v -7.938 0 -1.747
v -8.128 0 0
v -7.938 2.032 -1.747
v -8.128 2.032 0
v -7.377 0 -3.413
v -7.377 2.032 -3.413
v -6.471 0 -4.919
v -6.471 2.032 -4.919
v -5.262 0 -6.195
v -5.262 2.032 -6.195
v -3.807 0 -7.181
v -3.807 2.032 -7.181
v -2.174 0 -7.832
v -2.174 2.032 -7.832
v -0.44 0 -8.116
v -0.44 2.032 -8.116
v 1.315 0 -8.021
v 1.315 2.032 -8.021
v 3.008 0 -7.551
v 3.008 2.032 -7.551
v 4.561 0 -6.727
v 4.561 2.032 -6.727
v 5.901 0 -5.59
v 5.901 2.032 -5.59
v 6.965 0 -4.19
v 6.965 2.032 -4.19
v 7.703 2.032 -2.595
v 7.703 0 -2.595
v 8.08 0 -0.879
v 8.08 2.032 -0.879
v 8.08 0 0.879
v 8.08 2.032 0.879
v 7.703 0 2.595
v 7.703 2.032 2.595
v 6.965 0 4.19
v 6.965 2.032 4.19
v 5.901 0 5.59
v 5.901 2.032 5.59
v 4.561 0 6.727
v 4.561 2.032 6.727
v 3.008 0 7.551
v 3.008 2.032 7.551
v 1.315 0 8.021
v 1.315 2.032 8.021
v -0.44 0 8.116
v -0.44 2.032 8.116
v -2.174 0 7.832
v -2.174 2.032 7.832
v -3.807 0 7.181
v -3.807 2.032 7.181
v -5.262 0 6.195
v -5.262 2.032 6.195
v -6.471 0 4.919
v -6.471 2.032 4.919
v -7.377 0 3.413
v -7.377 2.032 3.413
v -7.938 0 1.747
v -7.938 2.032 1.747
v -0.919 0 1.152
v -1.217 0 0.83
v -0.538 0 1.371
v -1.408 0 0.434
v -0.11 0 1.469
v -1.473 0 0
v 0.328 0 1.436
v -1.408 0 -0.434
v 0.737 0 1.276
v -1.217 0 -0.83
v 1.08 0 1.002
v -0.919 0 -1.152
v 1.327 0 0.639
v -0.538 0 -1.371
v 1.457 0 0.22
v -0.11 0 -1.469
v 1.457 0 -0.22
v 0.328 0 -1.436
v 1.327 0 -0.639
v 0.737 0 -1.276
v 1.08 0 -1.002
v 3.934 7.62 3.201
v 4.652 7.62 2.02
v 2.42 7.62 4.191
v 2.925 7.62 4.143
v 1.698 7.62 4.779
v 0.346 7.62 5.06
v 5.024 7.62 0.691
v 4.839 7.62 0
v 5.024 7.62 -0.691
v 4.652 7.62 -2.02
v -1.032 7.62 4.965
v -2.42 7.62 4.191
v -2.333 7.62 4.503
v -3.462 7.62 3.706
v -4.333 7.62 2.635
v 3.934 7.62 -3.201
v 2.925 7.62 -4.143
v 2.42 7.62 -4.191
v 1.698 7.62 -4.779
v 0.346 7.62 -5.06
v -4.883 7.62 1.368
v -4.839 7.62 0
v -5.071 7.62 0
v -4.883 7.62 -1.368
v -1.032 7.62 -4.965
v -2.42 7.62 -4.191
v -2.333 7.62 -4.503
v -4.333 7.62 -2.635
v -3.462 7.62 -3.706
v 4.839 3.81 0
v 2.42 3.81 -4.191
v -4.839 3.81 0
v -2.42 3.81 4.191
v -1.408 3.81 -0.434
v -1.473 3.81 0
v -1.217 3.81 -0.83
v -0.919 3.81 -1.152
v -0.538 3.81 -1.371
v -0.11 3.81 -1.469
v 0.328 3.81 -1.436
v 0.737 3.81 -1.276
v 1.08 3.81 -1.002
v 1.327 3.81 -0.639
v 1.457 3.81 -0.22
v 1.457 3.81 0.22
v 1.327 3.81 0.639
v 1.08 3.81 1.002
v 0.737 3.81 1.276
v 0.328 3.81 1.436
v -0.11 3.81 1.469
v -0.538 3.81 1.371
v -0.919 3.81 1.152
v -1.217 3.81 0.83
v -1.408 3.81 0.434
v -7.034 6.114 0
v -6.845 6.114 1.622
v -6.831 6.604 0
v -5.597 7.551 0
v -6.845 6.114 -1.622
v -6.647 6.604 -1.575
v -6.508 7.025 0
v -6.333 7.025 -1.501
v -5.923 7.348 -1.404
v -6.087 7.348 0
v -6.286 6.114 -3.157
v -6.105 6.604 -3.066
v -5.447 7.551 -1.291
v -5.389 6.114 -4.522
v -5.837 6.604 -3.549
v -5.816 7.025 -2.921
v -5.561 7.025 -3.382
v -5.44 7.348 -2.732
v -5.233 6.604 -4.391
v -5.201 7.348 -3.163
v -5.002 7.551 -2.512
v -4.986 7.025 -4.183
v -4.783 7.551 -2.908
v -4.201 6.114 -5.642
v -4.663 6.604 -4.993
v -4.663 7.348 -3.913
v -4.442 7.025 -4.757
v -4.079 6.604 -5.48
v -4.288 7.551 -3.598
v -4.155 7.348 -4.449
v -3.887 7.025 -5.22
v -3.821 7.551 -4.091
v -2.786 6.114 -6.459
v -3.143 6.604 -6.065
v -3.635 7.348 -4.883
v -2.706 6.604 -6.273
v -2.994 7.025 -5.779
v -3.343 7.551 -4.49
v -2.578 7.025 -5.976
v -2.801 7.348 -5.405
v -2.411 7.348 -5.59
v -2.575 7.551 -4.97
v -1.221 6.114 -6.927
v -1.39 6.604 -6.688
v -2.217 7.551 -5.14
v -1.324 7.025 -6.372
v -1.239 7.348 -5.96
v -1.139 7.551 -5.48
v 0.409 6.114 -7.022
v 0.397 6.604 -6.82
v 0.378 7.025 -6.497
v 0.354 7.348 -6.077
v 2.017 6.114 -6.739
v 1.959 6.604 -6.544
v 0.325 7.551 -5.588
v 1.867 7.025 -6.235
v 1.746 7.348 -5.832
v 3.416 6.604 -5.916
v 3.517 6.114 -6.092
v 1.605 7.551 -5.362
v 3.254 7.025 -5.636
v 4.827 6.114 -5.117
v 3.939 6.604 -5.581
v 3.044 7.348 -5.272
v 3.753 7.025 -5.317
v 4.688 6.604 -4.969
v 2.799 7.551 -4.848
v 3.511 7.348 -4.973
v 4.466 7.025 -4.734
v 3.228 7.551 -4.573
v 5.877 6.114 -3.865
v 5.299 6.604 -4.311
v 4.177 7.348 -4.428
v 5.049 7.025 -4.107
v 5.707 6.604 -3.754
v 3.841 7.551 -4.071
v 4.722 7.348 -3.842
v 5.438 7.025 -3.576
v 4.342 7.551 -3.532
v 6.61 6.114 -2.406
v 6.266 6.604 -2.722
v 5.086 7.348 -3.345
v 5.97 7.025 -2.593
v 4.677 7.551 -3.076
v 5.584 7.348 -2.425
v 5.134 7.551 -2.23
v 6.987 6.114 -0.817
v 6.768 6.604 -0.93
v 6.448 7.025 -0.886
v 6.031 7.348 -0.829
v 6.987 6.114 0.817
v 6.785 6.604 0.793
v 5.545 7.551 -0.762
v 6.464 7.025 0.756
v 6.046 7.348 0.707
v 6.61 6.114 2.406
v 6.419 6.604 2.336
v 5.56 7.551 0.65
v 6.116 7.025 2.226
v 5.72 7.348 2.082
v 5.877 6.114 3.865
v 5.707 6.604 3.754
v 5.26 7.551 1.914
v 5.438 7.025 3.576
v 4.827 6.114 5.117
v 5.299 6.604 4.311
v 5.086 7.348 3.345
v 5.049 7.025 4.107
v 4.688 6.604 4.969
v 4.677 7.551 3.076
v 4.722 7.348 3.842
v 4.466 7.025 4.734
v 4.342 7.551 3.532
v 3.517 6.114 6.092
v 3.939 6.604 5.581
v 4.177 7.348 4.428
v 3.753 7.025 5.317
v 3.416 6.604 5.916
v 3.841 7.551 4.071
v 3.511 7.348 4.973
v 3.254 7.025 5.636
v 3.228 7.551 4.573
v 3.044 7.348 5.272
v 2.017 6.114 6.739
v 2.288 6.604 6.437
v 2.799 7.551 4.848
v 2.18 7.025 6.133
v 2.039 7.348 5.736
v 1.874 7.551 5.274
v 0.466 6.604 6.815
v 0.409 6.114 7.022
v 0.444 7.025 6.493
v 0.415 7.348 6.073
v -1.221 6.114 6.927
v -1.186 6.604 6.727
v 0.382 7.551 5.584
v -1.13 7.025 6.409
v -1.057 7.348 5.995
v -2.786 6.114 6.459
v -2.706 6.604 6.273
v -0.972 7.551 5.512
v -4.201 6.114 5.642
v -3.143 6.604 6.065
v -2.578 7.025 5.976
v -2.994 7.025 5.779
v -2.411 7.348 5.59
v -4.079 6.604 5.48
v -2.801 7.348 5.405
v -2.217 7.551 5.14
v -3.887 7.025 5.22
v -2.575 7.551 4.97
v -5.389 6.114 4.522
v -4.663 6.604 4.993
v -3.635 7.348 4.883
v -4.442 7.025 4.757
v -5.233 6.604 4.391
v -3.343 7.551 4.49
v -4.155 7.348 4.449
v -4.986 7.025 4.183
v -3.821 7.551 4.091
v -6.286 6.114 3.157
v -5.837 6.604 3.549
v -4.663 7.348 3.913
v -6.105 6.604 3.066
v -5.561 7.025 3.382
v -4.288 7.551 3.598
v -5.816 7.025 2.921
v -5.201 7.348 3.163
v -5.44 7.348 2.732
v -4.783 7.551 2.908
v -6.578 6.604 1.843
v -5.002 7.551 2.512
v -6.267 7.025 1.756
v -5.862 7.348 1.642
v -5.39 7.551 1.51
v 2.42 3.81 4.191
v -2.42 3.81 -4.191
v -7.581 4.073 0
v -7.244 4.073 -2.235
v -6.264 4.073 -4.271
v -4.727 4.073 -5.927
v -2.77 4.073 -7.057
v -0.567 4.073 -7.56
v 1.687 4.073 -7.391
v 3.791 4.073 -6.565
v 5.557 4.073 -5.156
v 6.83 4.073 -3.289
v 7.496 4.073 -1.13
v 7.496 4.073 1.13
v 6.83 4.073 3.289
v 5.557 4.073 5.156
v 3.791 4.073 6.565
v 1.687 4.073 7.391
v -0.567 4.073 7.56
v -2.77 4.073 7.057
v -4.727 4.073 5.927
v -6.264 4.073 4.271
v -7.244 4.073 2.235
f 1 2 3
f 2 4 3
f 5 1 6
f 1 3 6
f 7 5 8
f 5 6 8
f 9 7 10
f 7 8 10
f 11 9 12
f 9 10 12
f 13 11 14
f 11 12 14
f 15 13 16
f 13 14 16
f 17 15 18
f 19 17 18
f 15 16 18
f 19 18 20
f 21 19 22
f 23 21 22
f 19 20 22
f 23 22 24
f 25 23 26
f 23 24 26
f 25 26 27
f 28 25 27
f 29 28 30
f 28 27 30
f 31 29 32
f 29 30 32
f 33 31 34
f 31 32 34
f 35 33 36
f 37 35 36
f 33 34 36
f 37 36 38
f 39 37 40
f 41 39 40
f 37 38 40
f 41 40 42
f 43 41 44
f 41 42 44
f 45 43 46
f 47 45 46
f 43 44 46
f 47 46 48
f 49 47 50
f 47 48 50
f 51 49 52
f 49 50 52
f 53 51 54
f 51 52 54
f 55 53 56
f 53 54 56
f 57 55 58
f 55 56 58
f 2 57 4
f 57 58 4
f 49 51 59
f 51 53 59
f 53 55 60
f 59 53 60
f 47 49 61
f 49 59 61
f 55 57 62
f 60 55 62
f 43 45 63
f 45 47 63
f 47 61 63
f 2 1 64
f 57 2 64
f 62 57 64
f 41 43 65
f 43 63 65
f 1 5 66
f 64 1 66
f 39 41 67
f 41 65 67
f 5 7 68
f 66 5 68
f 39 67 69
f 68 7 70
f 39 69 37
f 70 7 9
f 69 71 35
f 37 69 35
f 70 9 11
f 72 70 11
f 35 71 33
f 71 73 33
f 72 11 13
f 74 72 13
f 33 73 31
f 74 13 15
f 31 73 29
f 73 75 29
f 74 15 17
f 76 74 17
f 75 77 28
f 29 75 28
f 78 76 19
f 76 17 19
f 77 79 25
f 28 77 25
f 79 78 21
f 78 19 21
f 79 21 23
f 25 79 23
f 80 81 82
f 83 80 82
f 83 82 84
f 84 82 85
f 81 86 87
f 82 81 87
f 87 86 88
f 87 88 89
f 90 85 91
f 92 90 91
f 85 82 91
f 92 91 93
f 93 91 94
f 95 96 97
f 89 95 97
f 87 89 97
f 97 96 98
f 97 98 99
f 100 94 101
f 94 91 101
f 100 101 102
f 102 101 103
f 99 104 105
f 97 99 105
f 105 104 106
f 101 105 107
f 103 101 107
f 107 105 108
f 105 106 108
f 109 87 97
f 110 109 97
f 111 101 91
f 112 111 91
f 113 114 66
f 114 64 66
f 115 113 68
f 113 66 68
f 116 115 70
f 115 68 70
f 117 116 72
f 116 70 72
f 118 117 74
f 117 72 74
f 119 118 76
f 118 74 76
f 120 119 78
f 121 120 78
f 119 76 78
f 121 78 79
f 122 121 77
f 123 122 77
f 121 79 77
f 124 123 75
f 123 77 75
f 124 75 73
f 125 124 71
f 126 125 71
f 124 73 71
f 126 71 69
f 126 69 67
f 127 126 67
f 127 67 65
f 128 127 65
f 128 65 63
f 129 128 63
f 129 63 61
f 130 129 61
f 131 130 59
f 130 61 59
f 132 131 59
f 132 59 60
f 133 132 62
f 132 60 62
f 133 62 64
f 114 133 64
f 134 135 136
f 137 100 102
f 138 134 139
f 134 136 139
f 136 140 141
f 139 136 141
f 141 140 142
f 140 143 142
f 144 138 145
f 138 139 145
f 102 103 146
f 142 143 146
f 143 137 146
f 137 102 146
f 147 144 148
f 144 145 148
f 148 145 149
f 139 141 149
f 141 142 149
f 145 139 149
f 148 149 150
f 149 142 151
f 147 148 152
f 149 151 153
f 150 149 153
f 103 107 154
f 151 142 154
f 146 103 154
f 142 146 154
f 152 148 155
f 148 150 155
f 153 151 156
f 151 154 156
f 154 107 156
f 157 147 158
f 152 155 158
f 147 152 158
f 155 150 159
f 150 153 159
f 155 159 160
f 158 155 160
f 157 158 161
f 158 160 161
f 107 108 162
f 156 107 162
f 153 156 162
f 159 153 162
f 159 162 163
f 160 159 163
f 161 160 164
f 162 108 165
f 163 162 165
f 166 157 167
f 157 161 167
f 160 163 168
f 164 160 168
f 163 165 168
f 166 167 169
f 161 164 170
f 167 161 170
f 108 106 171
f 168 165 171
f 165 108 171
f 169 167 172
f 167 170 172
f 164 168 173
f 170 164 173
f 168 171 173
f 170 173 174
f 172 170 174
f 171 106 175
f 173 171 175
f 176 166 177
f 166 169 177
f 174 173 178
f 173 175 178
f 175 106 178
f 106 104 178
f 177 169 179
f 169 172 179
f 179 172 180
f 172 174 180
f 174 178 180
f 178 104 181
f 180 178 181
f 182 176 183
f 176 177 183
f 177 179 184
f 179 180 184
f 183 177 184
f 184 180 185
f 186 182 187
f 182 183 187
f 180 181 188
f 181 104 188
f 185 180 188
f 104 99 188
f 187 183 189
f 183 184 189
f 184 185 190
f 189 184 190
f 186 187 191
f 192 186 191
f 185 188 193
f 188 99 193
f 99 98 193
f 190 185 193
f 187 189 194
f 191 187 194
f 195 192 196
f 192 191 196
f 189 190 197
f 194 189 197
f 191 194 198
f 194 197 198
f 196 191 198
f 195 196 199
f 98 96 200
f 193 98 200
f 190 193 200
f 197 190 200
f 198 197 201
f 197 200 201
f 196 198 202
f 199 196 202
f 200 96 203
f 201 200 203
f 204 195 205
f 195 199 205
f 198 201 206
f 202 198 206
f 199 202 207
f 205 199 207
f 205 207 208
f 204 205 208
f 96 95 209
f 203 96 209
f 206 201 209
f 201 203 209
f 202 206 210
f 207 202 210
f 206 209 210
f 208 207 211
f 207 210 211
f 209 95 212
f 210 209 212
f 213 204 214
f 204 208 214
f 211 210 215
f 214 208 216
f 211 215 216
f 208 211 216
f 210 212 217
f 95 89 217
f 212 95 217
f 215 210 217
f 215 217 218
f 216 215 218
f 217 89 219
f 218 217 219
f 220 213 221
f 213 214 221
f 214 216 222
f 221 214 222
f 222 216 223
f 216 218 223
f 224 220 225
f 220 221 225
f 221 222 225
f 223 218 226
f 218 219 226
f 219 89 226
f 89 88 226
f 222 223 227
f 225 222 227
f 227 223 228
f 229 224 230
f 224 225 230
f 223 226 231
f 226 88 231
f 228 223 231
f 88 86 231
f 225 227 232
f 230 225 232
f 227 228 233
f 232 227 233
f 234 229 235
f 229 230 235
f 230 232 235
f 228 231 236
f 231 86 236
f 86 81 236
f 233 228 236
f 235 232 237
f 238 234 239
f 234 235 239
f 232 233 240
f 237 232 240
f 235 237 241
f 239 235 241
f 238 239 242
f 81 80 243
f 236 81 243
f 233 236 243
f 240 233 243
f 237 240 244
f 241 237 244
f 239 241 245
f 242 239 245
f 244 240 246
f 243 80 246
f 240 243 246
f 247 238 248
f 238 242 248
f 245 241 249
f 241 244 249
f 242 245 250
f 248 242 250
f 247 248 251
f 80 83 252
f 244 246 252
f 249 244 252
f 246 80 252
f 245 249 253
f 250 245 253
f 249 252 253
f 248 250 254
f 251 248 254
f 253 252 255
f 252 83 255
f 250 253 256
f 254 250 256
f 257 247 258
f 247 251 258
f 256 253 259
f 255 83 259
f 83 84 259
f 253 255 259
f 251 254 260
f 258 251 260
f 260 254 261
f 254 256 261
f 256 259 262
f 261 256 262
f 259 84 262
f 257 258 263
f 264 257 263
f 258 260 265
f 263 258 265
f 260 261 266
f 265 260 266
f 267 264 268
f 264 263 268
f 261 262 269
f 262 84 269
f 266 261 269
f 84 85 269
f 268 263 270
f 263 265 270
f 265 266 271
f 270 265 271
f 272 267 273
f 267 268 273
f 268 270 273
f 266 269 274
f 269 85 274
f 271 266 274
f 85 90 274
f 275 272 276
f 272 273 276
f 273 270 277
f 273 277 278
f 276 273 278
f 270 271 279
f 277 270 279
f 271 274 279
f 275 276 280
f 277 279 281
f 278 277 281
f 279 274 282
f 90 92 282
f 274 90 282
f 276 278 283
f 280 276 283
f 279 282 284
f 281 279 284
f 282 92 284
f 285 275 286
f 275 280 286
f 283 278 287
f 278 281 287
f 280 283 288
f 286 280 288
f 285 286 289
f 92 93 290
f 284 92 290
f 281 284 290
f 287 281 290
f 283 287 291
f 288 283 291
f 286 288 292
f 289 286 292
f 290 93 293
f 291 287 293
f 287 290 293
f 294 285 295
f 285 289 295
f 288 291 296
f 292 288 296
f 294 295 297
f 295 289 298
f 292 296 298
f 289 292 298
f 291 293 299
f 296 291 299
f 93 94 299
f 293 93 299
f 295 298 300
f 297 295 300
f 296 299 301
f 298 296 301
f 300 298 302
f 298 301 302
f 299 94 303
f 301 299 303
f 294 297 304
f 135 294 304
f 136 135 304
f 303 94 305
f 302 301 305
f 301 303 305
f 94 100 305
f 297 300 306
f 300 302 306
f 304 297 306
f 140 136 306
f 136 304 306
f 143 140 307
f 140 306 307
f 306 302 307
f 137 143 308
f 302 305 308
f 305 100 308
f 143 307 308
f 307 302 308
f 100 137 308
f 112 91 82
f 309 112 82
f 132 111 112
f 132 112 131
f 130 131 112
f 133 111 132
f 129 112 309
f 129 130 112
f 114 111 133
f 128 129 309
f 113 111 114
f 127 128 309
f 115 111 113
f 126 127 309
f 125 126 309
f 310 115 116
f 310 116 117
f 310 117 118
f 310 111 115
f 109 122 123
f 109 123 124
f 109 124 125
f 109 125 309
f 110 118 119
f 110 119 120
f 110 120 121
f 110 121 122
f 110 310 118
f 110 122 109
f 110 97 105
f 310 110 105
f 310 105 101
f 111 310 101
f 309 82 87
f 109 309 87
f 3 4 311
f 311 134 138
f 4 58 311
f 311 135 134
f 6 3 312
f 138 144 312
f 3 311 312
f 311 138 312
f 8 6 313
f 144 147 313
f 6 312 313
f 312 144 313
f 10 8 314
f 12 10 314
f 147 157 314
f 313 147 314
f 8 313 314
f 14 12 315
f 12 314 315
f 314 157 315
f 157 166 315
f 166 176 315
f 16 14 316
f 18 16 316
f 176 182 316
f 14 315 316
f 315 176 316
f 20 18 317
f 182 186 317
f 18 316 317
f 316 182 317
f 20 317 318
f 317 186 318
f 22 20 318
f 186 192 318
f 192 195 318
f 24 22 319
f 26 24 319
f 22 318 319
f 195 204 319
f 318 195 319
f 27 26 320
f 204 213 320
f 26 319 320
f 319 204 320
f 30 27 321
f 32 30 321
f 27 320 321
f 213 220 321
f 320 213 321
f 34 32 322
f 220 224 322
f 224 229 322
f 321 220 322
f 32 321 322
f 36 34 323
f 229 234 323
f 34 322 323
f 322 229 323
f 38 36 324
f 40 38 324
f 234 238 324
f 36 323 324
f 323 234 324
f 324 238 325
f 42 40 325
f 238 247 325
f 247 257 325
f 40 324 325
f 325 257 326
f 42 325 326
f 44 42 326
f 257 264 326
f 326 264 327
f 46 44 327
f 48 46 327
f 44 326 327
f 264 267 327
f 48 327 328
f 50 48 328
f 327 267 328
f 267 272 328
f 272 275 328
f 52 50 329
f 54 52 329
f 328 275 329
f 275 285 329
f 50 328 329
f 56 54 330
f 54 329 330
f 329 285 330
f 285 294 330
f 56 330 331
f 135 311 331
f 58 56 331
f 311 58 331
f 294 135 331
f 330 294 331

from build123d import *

# Parameters (mm, degrees)
CUT_EXTRUDE1_DEPTH = 3.81


with BuildPart() as part:
    # Sketch1 → Revolve1 (revolve)
    with BuildSketch(Plane.XY):
        with BuildLine():
            Line((-1.4732, 0), (-8.128, 0))
            Line((-8.128, 0), (-8.128, 2.032))
            Line((-8.128, 2.032), (-7.034252752, 6.1139203))
            ThreePointArc((-7.034252752, 6.1139203), (-6.308494697, 7.200093987), (-5.071491473, 7.62))
            Line((-5.071491473, 7.62), (-1.4732, 7.62))
            Line((-1.4732, 7.62), (-1.4732, 0))
        make_face()
    revolve(axis=Axis((0, 0, 0), (0, -1, 0)))

    # Sketch2 → Cut-Extrude1 (cut)
    with BuildSketch(Plane(origin=(0, 7.62, 0), x_dir=(1, 0, 0), z_dir=(0, 1, 0))):
        Polygon((-4.839349956, 0), (-2.419674978, -4.191), (2.419674978, -4.191), (4.839349956, 0), (2.419674978, 4.191), (-2.419674978, 4.191), align=None)
    extrude(amount=-CUT_EXTRUDE1_DEPTH, mode=Mode.SUBTRACT)


solid = part.part
